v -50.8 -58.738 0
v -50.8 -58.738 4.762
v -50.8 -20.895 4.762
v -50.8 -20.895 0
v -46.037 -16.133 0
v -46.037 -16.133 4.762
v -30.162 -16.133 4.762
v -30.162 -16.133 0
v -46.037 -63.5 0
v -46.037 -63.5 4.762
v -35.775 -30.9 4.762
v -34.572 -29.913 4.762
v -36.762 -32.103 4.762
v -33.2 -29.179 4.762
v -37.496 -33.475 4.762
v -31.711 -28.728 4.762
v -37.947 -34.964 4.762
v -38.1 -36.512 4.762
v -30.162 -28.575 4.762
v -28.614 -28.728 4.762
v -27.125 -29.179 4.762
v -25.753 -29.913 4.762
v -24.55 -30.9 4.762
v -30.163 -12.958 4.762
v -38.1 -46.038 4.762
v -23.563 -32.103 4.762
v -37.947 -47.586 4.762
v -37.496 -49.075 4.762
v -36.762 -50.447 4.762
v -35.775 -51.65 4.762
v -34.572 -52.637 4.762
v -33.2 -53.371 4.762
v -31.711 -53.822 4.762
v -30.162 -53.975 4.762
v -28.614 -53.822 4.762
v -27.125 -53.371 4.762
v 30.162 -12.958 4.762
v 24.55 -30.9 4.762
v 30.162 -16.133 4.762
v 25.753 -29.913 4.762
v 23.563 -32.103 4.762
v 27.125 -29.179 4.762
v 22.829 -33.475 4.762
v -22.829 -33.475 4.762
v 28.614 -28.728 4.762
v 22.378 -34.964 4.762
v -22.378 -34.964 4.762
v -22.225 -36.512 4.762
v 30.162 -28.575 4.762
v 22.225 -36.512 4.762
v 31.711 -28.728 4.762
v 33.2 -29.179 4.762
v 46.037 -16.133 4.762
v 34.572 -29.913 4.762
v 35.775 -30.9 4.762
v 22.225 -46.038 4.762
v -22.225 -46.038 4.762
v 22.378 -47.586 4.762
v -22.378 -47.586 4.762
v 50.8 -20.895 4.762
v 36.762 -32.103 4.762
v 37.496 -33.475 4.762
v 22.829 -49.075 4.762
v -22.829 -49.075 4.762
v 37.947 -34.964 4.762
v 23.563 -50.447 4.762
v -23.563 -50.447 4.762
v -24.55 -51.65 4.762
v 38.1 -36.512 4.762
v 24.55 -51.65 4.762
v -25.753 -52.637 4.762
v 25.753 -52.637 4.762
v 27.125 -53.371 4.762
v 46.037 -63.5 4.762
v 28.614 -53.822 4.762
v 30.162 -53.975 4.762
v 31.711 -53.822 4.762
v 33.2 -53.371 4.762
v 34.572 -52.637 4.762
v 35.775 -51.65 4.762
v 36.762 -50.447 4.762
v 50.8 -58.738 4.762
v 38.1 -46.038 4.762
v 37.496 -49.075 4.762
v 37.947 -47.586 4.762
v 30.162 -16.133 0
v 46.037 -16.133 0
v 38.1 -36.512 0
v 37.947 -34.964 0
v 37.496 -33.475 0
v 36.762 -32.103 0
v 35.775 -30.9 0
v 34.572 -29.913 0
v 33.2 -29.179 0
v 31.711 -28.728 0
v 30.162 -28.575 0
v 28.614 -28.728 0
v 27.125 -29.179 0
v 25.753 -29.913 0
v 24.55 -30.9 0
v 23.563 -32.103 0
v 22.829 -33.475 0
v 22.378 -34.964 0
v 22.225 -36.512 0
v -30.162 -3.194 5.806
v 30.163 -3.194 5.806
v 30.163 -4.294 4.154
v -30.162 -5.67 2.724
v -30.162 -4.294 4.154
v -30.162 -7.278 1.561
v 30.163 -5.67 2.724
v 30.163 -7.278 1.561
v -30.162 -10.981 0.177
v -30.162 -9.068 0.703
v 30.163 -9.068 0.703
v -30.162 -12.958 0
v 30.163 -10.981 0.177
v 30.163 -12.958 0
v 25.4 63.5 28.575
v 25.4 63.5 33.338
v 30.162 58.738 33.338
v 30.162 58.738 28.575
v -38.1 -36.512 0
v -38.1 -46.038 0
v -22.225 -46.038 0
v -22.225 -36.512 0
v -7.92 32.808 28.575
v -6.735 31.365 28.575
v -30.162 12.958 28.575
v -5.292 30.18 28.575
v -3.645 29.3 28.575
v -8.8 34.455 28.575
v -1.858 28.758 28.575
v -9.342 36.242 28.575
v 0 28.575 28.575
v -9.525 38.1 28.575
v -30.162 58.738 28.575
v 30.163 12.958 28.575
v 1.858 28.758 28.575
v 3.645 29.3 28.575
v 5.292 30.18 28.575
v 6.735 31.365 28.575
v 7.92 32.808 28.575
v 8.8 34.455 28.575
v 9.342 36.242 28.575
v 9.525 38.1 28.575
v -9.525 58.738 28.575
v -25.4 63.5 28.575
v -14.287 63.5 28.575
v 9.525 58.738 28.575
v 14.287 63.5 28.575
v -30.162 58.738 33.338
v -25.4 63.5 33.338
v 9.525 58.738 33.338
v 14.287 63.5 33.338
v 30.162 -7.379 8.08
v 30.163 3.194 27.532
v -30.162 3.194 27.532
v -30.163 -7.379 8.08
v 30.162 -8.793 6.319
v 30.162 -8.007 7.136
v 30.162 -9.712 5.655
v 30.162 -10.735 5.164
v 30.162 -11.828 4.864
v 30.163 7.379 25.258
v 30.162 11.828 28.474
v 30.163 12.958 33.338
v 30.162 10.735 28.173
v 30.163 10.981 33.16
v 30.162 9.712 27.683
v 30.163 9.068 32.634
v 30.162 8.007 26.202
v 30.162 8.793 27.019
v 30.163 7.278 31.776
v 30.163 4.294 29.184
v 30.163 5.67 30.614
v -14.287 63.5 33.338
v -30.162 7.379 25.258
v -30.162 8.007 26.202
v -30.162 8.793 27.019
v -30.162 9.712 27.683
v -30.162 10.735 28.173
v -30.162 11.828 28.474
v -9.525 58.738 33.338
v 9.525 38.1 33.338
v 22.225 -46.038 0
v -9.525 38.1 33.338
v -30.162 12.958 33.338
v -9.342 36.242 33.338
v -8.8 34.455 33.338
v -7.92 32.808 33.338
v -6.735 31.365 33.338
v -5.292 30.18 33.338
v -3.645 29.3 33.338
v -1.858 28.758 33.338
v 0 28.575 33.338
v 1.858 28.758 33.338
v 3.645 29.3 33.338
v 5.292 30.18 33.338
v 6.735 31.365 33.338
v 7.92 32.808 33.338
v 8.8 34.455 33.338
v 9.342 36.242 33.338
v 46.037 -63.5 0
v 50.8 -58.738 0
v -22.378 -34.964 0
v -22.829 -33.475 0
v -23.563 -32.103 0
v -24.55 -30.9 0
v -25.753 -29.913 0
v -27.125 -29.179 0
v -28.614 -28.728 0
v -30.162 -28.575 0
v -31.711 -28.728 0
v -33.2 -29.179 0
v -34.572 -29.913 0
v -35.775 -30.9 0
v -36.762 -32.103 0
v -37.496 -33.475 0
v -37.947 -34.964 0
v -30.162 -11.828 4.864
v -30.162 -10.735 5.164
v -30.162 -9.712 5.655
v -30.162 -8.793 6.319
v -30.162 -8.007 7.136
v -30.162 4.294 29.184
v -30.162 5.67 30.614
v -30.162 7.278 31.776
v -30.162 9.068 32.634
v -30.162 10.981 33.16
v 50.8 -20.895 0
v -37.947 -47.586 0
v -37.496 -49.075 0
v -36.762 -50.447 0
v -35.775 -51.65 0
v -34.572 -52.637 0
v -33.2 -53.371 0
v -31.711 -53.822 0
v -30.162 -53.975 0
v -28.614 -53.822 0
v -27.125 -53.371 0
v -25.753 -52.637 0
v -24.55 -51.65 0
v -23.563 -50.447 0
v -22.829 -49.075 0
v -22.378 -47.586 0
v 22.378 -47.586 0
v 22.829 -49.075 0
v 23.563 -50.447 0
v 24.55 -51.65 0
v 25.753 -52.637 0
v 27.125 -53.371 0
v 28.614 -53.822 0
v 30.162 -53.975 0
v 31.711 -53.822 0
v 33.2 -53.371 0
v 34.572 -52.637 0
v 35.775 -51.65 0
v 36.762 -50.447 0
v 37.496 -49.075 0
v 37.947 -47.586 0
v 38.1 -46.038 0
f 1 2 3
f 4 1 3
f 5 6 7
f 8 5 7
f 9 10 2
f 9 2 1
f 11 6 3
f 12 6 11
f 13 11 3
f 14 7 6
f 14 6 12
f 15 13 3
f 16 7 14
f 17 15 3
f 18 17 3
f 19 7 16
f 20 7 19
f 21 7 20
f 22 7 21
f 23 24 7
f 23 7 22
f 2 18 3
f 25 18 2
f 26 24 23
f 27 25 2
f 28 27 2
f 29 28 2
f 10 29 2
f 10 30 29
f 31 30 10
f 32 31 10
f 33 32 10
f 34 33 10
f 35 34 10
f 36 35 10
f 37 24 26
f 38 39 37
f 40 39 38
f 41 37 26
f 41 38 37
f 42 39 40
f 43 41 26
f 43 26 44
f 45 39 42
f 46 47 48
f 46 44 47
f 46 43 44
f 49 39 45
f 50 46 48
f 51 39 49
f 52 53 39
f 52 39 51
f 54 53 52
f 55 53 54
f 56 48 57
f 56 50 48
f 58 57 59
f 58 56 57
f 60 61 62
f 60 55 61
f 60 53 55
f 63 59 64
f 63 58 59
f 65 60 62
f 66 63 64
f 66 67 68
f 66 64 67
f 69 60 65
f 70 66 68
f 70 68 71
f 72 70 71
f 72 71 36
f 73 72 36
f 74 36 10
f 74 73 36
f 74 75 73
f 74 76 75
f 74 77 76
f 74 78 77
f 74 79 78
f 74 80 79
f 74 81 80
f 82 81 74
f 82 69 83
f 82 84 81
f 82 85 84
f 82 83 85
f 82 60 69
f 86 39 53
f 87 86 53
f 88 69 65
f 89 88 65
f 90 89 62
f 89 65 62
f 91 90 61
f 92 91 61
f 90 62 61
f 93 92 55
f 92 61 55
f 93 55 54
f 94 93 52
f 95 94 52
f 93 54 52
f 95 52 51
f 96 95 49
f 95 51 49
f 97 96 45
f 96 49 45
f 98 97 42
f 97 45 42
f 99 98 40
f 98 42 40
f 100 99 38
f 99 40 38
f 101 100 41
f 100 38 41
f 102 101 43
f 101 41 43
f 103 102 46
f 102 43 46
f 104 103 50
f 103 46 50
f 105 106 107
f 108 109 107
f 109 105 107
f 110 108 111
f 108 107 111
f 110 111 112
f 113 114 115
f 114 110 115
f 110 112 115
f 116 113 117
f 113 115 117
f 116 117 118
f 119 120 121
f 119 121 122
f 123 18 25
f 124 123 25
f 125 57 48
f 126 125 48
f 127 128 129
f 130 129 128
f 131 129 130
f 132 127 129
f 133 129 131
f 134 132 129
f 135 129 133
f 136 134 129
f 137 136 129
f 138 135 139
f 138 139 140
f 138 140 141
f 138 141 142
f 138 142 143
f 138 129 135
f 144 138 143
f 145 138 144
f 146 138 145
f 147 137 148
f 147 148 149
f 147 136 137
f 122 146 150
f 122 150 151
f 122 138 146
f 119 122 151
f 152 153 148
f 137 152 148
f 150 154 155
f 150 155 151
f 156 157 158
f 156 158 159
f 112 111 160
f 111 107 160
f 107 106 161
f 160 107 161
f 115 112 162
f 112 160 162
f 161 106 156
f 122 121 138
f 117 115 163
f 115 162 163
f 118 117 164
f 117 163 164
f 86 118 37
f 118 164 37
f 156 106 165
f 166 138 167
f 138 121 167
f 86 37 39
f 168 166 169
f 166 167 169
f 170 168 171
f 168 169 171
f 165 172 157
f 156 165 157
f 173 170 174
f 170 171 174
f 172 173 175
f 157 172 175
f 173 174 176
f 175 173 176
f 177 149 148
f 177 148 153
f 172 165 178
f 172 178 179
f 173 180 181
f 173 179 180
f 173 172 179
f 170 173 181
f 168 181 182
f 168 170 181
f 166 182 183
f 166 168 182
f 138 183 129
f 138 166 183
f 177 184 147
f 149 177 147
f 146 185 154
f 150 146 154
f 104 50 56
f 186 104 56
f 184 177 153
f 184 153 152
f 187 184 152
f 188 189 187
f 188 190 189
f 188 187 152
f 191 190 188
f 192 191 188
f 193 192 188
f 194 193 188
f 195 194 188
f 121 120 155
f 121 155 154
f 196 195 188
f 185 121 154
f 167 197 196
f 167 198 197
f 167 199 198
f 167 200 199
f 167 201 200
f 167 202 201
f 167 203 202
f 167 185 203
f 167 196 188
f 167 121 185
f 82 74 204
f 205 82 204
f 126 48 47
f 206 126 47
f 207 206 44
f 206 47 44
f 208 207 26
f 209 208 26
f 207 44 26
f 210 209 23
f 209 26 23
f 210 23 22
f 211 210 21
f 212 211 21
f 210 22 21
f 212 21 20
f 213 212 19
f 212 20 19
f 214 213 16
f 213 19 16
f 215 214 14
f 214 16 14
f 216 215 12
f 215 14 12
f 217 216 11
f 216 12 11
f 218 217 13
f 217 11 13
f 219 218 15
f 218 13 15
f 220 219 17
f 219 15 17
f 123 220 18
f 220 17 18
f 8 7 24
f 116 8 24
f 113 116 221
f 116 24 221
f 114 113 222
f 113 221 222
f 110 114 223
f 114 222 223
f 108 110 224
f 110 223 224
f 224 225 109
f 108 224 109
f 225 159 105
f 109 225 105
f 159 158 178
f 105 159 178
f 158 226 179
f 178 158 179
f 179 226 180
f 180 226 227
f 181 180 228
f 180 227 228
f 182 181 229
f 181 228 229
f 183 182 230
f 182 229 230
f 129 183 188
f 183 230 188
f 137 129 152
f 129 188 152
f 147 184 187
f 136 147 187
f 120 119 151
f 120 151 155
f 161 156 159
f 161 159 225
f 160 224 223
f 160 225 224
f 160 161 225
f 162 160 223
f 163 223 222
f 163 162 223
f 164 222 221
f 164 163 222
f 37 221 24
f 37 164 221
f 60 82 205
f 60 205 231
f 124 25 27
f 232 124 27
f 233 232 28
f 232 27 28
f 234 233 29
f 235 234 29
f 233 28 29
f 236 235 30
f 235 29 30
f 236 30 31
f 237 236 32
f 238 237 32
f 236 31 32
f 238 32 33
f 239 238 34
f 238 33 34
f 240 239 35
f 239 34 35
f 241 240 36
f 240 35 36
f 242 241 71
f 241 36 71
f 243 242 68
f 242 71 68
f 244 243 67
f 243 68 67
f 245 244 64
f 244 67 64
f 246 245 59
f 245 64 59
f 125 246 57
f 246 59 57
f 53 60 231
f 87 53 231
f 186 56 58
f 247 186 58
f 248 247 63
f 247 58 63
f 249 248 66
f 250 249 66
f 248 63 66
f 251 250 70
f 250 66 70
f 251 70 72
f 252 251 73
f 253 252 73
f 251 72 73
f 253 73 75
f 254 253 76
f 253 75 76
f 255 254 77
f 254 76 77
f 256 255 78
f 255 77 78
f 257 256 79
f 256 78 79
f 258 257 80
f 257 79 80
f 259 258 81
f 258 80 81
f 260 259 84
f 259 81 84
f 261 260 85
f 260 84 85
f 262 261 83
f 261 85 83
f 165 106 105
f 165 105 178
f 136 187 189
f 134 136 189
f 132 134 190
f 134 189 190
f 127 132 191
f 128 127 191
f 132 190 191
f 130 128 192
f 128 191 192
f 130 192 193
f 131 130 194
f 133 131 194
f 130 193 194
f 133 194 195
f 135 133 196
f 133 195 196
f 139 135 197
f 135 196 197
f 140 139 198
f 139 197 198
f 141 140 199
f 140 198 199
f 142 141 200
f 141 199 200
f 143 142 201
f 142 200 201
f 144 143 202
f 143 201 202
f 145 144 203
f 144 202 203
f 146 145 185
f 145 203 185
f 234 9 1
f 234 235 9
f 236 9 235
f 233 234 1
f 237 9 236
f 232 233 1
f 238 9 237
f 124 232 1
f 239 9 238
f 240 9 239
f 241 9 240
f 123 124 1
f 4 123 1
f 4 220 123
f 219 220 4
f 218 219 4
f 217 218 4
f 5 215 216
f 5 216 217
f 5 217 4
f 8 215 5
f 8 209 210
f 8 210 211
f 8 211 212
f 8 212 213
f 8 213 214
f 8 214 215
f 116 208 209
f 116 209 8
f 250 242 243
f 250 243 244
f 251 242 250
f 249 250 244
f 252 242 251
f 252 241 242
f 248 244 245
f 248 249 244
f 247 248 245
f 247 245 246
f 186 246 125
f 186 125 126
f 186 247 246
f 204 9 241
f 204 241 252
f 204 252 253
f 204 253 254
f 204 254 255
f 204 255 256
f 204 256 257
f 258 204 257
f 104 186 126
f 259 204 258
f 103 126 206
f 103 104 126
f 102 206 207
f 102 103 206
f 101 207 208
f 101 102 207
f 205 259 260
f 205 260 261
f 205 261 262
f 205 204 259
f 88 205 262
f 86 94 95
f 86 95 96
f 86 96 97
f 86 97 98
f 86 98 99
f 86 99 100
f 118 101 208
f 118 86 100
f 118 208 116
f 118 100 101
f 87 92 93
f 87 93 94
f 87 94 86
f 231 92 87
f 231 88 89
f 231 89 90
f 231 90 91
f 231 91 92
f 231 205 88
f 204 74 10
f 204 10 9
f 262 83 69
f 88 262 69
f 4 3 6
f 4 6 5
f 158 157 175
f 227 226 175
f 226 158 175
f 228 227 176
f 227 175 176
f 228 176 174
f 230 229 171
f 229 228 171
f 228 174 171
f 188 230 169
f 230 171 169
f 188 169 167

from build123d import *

# Parameters (mm, degrees)
F1_DEPTH = 50.8
F2_R     = 11.1125
F3_W     = 20.6375
F3_H     = 29.0905938273
F3_H_2   = 50.5422030863
F4_DEPTH = 33.3385
F5_SIZE  = 4.7625


with BuildPart() as f1:
    # F0 (on Right) → F1 (new body, symmetric)
    with BuildSketch(Plane.YZ):
        with BuildLine():
            Line((-63.5, 4.7625), (-63.5, 0))
            Line((-63.5, 0), (-6.35, 0))
            Line((-6.35, 0), (7.3786968916, 25.2575142941))
            ThreePointArc((7.3786968916, 25.2575142941), (9.7123359116, 27.6829742473), (12.9577969137, 28.575))
            Line((12.9577969137, 28.575), (63.5, 28.575))
            Line((63.5, 28.575), (63.5, 33.3375))
            Line((63.5, 33.3375), (6.35, 33.3375))
            Line((6.35, 33.3375), (-7.3786968916, 8.0799857059))
            ThreePointArc((-7.3786968916, 8.0799857059), (-9.7123359116, 5.6545257527), (-12.9577969137, 4.7625))
            Line((-12.9577969137, 4.7625), (-63.5, 4.7625))
        make_face()
    extrude(amount=F1_DEPTH, both=True)

    # F2
    f2_edges = [f1.edges().sort_by_distance(p)[0] for p in [
        (0, 6.35, 33.3375),
        (0, -6.35, 0),
    ]]
    fillet(f2_edges, radius=F2_R)

    # F3 (on face) → F4 (cut, through all)
    with BuildSketch(Plane.XY.offset(33.3375)):
        with BuildLine():
            Line((-38.1, -36.5125), (-38.1, -46.0375))
            ThreePointArc((-38.1, -46.0375), (-30.1625, -53.975), (-22.225, -46.0375))
            Line((-22.225, -46.0375), (-22.225, -36.5125))
            ThreePointArc((-22.225, -36.5125), (-30.1625, -28.575), (-38.1, -36.5125))
        make_face()
        with BuildLine():
            ThreePointArc((38.1, -36.5125), (30.1625, -28.575), (22.225, -36.5125))
            Line((22.225, -36.5125), (22.225, -46.0375))
            ThreePointArc((22.225, -46.0375), (30.1625, -53.975), (38.1, -46.0375))
            Line((38.1, -46.0375), (38.1, -36.5125))
        make_face()
        with Locations((-40.48125, -1.5875)):
            Rectangle(F3_W, F3_H)
        with Locations((40.48125, -1.5875)):
            Rectangle(F3_W, F3_H)
        with BuildLine():
            ThreePointArc((9.525, 38.1), (0, 47.625), (-9.525, 38.1))
            ThreePointArc((-9.525, 38.1), (0, 28.575), (9.525, 38.1))
        make_face()
        with BuildLine():
            Line((9.525, 63.5), (-9.525, 63.5))
            Line((-9.525, 63.5), (-9.525, 38.1))
            ThreePointArc((-9.525, 38.1), (0, 47.625), (9.525, 38.1))
            Line((9.525, 38.1), (9.525, 63.5))
        make_face()
        with Locations((-40.48125, 38.2288984568)):
            Rectangle(F3_W, F3_H_2)
        with Locations((40.48125, 38.2288984568)):
            Rectangle(F3_W, F3_H_2)
    extrude(amount=-F4_DEPTH, mode=Mode.SUBTRACT)

    # F5
    f5_edges = [f1.edges().sort_by_distance(p)[0] for p in [
        (50.8, -63.5, 2.38125),
        (50.8, -16.132797, 2.38125),
        (-50.8, -63.5, 2.38125),
        (-50.8, -16.132797, 2.38125),
        (30.1625, 63.5, 30.95625),
        (-30.1625, 63.5, 30.95625),
        (9.525, 63.5, 30.95625),
        (-9.525, 63.5, 30.95625),
    ]]
    chamfer(f5_edges, length=F5_SIZE)


solid = f1.part
